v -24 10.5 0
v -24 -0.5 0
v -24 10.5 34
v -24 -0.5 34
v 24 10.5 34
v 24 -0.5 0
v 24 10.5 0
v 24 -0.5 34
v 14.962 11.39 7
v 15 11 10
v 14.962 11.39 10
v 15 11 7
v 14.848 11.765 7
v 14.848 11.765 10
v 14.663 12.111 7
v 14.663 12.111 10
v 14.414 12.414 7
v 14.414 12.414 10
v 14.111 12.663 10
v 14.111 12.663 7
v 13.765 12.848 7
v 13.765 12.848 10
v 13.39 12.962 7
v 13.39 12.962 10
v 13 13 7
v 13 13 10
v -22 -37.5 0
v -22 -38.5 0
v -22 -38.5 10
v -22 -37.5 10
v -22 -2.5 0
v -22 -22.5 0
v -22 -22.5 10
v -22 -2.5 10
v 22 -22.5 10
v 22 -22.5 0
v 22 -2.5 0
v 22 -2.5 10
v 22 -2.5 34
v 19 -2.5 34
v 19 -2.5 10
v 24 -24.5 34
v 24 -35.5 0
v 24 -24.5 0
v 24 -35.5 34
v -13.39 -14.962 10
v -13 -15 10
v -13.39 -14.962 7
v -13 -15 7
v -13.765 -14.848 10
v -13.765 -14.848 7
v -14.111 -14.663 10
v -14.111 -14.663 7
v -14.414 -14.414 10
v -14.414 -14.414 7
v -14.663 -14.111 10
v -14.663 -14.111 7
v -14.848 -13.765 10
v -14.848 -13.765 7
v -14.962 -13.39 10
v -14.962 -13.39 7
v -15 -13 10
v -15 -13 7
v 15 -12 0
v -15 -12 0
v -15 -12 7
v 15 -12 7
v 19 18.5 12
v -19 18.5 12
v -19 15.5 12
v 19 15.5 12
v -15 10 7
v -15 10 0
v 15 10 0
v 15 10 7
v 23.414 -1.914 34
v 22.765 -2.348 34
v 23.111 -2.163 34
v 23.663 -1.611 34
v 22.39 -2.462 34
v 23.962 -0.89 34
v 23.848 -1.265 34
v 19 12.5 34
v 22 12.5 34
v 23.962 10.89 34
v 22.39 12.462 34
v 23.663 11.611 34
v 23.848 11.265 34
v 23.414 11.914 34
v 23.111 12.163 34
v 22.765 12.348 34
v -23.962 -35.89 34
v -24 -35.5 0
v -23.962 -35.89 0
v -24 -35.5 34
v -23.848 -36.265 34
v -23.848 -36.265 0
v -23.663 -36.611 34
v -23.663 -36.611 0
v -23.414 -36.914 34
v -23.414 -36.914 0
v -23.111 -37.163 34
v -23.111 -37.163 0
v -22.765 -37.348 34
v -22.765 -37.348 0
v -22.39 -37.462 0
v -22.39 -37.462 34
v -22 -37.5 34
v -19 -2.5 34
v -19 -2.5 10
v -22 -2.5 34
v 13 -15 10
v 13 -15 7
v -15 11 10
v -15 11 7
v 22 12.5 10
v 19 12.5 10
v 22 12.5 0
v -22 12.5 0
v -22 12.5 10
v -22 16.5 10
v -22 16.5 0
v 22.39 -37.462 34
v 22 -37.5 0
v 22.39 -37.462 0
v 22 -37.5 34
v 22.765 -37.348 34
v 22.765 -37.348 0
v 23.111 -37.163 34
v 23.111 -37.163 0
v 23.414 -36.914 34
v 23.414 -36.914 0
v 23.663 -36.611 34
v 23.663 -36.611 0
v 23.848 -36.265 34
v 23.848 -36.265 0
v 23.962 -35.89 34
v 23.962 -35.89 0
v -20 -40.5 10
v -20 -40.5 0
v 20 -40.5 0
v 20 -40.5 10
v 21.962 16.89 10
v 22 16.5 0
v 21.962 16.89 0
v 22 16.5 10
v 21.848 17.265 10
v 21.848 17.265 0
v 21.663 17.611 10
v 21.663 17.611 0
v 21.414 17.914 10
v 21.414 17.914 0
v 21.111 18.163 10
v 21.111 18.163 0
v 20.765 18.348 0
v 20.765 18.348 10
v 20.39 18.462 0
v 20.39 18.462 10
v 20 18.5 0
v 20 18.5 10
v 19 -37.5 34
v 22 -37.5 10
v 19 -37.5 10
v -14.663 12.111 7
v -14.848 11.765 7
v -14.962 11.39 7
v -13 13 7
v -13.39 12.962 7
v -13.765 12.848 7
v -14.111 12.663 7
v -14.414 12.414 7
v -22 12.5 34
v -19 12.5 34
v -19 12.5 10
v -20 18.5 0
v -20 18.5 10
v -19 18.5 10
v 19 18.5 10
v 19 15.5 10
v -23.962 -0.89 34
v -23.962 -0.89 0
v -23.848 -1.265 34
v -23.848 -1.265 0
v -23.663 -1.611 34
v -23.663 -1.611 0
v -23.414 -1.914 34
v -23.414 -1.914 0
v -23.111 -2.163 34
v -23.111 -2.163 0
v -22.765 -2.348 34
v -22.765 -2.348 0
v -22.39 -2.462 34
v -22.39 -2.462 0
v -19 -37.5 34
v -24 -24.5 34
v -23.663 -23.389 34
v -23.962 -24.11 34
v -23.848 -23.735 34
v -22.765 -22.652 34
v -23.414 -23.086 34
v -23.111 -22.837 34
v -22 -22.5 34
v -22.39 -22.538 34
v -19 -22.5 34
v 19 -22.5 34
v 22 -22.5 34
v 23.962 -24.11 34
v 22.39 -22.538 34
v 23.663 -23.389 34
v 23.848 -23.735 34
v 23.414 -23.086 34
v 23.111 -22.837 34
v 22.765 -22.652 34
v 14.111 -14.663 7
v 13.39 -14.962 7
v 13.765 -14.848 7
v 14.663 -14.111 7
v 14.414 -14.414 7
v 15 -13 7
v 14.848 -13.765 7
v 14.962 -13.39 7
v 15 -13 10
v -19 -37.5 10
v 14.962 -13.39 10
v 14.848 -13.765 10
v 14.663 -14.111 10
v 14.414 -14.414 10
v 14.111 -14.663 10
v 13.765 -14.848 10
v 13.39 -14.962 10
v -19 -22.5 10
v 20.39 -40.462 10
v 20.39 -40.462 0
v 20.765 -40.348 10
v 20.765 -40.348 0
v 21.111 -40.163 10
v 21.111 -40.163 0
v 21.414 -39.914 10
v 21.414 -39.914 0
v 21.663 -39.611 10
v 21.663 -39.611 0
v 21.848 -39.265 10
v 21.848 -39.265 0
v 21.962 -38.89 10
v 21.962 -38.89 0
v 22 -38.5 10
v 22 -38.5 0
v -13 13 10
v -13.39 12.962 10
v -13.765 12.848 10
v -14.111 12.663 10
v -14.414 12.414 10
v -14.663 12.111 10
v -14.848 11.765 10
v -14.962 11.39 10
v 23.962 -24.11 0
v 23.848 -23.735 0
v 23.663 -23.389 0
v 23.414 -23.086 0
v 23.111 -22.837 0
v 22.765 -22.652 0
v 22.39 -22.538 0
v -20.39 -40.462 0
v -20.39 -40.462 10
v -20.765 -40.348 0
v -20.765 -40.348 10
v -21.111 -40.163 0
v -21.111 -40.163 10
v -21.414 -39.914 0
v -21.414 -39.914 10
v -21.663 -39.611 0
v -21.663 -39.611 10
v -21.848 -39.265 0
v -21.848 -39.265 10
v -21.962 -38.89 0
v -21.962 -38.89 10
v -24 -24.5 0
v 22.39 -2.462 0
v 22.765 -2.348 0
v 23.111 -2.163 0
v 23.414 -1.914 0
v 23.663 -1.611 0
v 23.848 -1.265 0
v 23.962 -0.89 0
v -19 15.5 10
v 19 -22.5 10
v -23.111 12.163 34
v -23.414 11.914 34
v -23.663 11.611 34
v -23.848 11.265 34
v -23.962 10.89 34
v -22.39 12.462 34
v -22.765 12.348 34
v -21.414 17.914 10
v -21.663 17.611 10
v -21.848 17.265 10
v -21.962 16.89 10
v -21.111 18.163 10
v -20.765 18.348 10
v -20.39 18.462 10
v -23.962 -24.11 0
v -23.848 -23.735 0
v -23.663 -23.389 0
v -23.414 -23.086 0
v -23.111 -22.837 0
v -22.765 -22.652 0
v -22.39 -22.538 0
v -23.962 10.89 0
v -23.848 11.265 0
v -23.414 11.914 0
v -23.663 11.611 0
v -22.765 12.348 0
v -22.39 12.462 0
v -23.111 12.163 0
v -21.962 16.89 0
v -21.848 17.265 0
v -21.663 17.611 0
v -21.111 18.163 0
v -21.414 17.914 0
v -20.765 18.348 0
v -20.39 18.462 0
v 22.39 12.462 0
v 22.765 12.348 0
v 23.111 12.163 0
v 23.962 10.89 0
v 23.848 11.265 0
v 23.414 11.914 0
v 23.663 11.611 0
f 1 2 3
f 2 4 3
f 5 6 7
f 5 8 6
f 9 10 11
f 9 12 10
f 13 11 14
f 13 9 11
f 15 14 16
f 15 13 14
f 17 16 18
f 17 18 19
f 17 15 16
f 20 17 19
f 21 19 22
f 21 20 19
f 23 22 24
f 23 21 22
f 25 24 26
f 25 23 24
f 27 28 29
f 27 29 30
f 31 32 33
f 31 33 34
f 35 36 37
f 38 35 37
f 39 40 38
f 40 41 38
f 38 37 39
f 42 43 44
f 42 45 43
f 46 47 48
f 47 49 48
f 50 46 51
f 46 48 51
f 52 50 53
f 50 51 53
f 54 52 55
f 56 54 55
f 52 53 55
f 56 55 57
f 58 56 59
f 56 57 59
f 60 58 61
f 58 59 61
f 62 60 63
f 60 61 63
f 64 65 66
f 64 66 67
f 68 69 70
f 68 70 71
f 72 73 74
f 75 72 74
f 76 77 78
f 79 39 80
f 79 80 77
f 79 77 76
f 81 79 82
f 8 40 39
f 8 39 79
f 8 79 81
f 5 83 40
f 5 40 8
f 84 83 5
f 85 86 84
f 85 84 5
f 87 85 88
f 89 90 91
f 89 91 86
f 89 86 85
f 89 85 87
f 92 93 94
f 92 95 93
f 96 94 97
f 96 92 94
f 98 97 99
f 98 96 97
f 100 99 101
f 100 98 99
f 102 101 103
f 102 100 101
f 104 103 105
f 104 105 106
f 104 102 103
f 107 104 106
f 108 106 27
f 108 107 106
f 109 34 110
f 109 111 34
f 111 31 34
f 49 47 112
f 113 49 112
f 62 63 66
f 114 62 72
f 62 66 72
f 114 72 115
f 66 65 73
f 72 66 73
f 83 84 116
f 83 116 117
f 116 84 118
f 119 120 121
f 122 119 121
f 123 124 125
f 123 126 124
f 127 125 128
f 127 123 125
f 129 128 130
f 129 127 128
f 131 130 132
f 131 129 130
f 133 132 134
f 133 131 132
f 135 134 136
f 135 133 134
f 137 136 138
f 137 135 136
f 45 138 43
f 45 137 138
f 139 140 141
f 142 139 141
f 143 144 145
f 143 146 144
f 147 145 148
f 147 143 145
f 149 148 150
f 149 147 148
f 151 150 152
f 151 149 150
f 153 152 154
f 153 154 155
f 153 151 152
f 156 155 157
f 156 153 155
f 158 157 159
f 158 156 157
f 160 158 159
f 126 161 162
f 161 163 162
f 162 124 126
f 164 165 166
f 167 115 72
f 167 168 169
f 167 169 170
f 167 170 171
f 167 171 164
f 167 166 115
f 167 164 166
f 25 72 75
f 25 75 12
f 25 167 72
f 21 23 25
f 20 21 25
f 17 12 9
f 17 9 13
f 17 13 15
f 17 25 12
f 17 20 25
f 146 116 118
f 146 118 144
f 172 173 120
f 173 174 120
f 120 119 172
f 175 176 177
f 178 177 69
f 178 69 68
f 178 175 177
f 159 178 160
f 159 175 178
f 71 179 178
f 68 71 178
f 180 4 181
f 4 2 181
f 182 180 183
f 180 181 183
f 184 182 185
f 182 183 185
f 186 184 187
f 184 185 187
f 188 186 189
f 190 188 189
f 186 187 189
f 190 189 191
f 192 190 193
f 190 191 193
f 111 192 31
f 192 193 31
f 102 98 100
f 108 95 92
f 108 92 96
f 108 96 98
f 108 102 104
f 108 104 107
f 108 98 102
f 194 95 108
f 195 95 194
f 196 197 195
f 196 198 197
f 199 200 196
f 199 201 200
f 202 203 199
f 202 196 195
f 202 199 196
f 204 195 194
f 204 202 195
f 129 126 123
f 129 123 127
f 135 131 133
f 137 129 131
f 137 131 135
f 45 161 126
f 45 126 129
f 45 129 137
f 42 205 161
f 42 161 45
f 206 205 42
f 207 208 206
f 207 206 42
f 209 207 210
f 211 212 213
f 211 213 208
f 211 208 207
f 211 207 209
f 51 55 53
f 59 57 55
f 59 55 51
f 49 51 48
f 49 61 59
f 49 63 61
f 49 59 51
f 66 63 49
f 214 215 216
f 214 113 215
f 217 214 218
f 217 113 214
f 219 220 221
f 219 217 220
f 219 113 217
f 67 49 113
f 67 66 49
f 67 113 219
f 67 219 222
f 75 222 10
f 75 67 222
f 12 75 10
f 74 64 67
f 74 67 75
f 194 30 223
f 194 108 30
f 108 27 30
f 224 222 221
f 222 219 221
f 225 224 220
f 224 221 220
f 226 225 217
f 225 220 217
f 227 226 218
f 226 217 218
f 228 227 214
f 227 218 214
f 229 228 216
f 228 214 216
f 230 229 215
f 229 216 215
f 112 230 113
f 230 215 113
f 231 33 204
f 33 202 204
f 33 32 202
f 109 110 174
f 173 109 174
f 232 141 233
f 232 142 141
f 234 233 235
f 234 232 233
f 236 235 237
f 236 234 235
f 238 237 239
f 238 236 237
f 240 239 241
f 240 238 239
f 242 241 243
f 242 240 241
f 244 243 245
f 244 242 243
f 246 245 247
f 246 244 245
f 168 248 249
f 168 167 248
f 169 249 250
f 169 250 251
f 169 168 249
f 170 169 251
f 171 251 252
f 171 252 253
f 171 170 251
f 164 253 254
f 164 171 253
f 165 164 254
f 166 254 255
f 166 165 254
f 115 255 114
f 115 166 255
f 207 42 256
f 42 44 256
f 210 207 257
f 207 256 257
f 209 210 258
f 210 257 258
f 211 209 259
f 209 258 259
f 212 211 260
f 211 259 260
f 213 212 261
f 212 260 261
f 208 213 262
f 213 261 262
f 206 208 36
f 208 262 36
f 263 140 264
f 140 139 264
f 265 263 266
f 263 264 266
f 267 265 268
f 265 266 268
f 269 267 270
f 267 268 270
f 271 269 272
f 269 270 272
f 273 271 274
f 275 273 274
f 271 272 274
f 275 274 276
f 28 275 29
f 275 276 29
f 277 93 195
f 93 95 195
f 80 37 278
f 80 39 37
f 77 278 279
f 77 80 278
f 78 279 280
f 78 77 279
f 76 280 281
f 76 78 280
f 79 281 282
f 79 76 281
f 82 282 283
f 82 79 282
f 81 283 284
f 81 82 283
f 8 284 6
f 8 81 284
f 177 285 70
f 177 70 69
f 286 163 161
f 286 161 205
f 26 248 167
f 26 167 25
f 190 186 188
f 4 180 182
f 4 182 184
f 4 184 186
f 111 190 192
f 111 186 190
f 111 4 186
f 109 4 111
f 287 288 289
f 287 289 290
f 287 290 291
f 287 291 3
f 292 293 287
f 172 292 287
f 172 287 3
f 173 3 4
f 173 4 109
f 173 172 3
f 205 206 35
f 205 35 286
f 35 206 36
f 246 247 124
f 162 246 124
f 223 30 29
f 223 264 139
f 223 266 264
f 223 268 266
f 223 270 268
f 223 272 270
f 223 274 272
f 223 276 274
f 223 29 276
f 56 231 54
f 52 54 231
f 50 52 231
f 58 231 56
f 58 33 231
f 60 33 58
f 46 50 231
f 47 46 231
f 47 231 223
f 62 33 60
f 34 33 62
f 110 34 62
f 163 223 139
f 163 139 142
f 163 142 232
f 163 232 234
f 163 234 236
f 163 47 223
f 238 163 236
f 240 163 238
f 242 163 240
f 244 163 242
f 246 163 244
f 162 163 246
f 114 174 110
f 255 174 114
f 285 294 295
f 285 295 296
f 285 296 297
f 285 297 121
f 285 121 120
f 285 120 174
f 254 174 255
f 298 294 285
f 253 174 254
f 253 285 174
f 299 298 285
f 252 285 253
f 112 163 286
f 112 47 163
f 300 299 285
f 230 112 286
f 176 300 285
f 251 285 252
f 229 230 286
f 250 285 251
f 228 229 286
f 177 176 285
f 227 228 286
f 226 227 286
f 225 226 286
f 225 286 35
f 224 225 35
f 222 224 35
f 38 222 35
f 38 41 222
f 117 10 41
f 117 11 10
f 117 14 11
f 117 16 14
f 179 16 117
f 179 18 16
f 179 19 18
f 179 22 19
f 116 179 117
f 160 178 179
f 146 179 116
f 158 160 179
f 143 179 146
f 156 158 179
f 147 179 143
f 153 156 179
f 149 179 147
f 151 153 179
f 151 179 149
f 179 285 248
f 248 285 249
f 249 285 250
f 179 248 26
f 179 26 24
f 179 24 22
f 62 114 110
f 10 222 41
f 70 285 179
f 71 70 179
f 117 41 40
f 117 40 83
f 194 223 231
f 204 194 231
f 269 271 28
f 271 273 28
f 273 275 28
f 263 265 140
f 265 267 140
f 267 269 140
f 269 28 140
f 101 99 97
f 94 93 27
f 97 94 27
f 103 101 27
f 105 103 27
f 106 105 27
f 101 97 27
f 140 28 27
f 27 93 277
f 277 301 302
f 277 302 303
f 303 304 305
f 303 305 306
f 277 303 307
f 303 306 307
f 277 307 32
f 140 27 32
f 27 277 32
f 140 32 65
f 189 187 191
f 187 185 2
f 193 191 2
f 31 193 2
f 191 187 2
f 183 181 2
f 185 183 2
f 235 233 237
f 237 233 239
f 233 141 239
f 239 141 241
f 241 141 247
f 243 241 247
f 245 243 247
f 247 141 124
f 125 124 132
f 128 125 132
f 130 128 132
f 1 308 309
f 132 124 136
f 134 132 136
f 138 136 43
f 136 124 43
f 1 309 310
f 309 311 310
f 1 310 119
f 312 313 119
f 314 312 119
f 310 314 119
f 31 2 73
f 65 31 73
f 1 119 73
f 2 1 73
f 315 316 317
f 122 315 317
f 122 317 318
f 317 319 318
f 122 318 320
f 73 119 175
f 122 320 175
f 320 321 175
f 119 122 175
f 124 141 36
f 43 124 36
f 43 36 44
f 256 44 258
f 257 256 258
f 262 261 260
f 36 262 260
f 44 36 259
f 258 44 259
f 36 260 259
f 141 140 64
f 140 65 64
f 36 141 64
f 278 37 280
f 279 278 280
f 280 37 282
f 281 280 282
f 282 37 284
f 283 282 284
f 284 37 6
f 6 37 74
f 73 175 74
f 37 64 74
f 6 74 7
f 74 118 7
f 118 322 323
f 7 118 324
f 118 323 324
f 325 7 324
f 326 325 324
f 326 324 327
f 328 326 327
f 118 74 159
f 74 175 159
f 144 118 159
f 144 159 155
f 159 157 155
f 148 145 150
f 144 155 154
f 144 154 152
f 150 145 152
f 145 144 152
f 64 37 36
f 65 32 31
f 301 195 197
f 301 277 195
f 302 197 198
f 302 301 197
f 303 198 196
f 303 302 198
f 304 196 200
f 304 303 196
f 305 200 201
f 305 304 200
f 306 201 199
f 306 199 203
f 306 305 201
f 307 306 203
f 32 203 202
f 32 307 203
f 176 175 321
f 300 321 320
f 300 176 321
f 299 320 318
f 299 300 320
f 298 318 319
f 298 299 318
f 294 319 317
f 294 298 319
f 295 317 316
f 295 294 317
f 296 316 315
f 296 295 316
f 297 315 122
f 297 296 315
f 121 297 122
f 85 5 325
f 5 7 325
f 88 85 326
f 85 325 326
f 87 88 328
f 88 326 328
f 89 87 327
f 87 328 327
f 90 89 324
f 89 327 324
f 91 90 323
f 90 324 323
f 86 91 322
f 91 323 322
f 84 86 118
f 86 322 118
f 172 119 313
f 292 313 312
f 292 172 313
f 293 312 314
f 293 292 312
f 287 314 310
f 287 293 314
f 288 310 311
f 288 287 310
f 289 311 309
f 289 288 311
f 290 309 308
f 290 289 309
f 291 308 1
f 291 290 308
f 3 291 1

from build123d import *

# Parameters (mm, degrees)
F0_W     = 44
F0_H     = 59
F0_W_2   = 30
F0_H_2   = 22
F1_DEPTH = 10
F2_W     = 30
F2_H     = 3
F3_DEPTH = 3
F4_W     = 38
F4_H     = 3
F5_DEPTH = 2
F6_W     = 3
F6_H     = 15
F6_W_2   = 2
F7_DEPTH = 24
F8_DEPTH = 10
F9_R     = 1.99999


# Not quite as in the source:
# - a fillet or chamfer is up to 0.001 mm smaller than in the source, because OpenCascade refuses the exact size


with BuildPart() as f1:
    # F0 (on Top) → F1 (new body)
    with BuildSketch(Plane.XY):
        with Locations((0, -11)):
            Rectangle(F0_W, F0_H)
        with Locations((0, -1)):
            Rectangle(F0_W_2, F0_H_2, mode=Mode.SUBTRACT)
    extrude(amount=F1_DEPTH)

    # F2 (on face) → F3 (cut)
    with BuildSketch(Plane.XY.offset(10)):
        with Locations((0, -13.5)):
            Rectangle(F2_W, F2_H)
        with Locations((0, 11.5)):
            Rectangle(F2_W, F2_H)
    extrude(amount=-F3_DEPTH, mode=Mode.SUBTRACT)

    # F4 (on face) → F5 (join)
    with BuildSketch(Plane.XY.offset(10)):
        with Locations((0, 17)):
            Rectangle(F4_W, F4_H)
    extrude(amount=F5_DEPTH)

    # F6 (on face) → F7 (join)
    with BuildSketch(Plane.XY.offset(10)):
        with Locations((-20.5, 5)):
            Rectangle(F6_W, F6_H)
        with Locations((-23, 5)):
            Rectangle(F6_W_2, F6_H)
        with Locations((-23, -30)):
            Rectangle(F6_W_2, F6_H)
        with Locations((-20.5, -30)):
            Rectangle(F6_W, F6_H)
        with Locations((23, 5)):
            Rectangle(F6_W_2, F6_H)
        with Locations((23, -30)):
            Rectangle(F6_W_2, F6_H)
        with Locations((20.5, -30)):
            Rectangle(F6_W, F6_H)
        with Locations((20.5, 5)):
            Rectangle(F6_W, F6_H)
    extrude(amount=F7_DEPTH)

    # F6 (on face) → F8 (join, through all)
    with BuildSketch(Plane.XY.offset(10)):
        with Locations((-23, -30)):
            Rectangle(F6_W_2, F6_H)
        with Locations((-23, 5)):
            Rectangle(F6_W_2, F6_H)
        with Locations((23, -30)):
            Rectangle(F6_W_2, F6_H)
        with Locations((23, 5)):
            Rectangle(F6_W_2, F6_H)
    extrude(amount=-F8_DEPTH)

    # F9 (radius 2 in the source; OpenCascade refuses exactly that, so slightly less here)
    f9_edges = [f1.edges().sort_by_distance(p)[0] for p in [
        (24, 12.5, 17),
        (-24, 12.5, 17),
        (-24, -2.5, 17),
        (-24, -22.5, 17),
        (-24, -37.5, 17),
        (24, -37.5, 17),
        (24, -22.5, 17),
        (22, -40.5, 5),
        (-22, -40.5, 5),
        (22, 18.5, 5),
        (-22, 18.5, 5),
        (24, -2.5, 17),
        (-15, 13, 8.5),
        (15, 13, 8.5),
        (-15, -15, 8.5),
        (15, -15, 8.5),
    ]]
    fillet(f9_edges, radius=F9_R)


solid = f1.part
